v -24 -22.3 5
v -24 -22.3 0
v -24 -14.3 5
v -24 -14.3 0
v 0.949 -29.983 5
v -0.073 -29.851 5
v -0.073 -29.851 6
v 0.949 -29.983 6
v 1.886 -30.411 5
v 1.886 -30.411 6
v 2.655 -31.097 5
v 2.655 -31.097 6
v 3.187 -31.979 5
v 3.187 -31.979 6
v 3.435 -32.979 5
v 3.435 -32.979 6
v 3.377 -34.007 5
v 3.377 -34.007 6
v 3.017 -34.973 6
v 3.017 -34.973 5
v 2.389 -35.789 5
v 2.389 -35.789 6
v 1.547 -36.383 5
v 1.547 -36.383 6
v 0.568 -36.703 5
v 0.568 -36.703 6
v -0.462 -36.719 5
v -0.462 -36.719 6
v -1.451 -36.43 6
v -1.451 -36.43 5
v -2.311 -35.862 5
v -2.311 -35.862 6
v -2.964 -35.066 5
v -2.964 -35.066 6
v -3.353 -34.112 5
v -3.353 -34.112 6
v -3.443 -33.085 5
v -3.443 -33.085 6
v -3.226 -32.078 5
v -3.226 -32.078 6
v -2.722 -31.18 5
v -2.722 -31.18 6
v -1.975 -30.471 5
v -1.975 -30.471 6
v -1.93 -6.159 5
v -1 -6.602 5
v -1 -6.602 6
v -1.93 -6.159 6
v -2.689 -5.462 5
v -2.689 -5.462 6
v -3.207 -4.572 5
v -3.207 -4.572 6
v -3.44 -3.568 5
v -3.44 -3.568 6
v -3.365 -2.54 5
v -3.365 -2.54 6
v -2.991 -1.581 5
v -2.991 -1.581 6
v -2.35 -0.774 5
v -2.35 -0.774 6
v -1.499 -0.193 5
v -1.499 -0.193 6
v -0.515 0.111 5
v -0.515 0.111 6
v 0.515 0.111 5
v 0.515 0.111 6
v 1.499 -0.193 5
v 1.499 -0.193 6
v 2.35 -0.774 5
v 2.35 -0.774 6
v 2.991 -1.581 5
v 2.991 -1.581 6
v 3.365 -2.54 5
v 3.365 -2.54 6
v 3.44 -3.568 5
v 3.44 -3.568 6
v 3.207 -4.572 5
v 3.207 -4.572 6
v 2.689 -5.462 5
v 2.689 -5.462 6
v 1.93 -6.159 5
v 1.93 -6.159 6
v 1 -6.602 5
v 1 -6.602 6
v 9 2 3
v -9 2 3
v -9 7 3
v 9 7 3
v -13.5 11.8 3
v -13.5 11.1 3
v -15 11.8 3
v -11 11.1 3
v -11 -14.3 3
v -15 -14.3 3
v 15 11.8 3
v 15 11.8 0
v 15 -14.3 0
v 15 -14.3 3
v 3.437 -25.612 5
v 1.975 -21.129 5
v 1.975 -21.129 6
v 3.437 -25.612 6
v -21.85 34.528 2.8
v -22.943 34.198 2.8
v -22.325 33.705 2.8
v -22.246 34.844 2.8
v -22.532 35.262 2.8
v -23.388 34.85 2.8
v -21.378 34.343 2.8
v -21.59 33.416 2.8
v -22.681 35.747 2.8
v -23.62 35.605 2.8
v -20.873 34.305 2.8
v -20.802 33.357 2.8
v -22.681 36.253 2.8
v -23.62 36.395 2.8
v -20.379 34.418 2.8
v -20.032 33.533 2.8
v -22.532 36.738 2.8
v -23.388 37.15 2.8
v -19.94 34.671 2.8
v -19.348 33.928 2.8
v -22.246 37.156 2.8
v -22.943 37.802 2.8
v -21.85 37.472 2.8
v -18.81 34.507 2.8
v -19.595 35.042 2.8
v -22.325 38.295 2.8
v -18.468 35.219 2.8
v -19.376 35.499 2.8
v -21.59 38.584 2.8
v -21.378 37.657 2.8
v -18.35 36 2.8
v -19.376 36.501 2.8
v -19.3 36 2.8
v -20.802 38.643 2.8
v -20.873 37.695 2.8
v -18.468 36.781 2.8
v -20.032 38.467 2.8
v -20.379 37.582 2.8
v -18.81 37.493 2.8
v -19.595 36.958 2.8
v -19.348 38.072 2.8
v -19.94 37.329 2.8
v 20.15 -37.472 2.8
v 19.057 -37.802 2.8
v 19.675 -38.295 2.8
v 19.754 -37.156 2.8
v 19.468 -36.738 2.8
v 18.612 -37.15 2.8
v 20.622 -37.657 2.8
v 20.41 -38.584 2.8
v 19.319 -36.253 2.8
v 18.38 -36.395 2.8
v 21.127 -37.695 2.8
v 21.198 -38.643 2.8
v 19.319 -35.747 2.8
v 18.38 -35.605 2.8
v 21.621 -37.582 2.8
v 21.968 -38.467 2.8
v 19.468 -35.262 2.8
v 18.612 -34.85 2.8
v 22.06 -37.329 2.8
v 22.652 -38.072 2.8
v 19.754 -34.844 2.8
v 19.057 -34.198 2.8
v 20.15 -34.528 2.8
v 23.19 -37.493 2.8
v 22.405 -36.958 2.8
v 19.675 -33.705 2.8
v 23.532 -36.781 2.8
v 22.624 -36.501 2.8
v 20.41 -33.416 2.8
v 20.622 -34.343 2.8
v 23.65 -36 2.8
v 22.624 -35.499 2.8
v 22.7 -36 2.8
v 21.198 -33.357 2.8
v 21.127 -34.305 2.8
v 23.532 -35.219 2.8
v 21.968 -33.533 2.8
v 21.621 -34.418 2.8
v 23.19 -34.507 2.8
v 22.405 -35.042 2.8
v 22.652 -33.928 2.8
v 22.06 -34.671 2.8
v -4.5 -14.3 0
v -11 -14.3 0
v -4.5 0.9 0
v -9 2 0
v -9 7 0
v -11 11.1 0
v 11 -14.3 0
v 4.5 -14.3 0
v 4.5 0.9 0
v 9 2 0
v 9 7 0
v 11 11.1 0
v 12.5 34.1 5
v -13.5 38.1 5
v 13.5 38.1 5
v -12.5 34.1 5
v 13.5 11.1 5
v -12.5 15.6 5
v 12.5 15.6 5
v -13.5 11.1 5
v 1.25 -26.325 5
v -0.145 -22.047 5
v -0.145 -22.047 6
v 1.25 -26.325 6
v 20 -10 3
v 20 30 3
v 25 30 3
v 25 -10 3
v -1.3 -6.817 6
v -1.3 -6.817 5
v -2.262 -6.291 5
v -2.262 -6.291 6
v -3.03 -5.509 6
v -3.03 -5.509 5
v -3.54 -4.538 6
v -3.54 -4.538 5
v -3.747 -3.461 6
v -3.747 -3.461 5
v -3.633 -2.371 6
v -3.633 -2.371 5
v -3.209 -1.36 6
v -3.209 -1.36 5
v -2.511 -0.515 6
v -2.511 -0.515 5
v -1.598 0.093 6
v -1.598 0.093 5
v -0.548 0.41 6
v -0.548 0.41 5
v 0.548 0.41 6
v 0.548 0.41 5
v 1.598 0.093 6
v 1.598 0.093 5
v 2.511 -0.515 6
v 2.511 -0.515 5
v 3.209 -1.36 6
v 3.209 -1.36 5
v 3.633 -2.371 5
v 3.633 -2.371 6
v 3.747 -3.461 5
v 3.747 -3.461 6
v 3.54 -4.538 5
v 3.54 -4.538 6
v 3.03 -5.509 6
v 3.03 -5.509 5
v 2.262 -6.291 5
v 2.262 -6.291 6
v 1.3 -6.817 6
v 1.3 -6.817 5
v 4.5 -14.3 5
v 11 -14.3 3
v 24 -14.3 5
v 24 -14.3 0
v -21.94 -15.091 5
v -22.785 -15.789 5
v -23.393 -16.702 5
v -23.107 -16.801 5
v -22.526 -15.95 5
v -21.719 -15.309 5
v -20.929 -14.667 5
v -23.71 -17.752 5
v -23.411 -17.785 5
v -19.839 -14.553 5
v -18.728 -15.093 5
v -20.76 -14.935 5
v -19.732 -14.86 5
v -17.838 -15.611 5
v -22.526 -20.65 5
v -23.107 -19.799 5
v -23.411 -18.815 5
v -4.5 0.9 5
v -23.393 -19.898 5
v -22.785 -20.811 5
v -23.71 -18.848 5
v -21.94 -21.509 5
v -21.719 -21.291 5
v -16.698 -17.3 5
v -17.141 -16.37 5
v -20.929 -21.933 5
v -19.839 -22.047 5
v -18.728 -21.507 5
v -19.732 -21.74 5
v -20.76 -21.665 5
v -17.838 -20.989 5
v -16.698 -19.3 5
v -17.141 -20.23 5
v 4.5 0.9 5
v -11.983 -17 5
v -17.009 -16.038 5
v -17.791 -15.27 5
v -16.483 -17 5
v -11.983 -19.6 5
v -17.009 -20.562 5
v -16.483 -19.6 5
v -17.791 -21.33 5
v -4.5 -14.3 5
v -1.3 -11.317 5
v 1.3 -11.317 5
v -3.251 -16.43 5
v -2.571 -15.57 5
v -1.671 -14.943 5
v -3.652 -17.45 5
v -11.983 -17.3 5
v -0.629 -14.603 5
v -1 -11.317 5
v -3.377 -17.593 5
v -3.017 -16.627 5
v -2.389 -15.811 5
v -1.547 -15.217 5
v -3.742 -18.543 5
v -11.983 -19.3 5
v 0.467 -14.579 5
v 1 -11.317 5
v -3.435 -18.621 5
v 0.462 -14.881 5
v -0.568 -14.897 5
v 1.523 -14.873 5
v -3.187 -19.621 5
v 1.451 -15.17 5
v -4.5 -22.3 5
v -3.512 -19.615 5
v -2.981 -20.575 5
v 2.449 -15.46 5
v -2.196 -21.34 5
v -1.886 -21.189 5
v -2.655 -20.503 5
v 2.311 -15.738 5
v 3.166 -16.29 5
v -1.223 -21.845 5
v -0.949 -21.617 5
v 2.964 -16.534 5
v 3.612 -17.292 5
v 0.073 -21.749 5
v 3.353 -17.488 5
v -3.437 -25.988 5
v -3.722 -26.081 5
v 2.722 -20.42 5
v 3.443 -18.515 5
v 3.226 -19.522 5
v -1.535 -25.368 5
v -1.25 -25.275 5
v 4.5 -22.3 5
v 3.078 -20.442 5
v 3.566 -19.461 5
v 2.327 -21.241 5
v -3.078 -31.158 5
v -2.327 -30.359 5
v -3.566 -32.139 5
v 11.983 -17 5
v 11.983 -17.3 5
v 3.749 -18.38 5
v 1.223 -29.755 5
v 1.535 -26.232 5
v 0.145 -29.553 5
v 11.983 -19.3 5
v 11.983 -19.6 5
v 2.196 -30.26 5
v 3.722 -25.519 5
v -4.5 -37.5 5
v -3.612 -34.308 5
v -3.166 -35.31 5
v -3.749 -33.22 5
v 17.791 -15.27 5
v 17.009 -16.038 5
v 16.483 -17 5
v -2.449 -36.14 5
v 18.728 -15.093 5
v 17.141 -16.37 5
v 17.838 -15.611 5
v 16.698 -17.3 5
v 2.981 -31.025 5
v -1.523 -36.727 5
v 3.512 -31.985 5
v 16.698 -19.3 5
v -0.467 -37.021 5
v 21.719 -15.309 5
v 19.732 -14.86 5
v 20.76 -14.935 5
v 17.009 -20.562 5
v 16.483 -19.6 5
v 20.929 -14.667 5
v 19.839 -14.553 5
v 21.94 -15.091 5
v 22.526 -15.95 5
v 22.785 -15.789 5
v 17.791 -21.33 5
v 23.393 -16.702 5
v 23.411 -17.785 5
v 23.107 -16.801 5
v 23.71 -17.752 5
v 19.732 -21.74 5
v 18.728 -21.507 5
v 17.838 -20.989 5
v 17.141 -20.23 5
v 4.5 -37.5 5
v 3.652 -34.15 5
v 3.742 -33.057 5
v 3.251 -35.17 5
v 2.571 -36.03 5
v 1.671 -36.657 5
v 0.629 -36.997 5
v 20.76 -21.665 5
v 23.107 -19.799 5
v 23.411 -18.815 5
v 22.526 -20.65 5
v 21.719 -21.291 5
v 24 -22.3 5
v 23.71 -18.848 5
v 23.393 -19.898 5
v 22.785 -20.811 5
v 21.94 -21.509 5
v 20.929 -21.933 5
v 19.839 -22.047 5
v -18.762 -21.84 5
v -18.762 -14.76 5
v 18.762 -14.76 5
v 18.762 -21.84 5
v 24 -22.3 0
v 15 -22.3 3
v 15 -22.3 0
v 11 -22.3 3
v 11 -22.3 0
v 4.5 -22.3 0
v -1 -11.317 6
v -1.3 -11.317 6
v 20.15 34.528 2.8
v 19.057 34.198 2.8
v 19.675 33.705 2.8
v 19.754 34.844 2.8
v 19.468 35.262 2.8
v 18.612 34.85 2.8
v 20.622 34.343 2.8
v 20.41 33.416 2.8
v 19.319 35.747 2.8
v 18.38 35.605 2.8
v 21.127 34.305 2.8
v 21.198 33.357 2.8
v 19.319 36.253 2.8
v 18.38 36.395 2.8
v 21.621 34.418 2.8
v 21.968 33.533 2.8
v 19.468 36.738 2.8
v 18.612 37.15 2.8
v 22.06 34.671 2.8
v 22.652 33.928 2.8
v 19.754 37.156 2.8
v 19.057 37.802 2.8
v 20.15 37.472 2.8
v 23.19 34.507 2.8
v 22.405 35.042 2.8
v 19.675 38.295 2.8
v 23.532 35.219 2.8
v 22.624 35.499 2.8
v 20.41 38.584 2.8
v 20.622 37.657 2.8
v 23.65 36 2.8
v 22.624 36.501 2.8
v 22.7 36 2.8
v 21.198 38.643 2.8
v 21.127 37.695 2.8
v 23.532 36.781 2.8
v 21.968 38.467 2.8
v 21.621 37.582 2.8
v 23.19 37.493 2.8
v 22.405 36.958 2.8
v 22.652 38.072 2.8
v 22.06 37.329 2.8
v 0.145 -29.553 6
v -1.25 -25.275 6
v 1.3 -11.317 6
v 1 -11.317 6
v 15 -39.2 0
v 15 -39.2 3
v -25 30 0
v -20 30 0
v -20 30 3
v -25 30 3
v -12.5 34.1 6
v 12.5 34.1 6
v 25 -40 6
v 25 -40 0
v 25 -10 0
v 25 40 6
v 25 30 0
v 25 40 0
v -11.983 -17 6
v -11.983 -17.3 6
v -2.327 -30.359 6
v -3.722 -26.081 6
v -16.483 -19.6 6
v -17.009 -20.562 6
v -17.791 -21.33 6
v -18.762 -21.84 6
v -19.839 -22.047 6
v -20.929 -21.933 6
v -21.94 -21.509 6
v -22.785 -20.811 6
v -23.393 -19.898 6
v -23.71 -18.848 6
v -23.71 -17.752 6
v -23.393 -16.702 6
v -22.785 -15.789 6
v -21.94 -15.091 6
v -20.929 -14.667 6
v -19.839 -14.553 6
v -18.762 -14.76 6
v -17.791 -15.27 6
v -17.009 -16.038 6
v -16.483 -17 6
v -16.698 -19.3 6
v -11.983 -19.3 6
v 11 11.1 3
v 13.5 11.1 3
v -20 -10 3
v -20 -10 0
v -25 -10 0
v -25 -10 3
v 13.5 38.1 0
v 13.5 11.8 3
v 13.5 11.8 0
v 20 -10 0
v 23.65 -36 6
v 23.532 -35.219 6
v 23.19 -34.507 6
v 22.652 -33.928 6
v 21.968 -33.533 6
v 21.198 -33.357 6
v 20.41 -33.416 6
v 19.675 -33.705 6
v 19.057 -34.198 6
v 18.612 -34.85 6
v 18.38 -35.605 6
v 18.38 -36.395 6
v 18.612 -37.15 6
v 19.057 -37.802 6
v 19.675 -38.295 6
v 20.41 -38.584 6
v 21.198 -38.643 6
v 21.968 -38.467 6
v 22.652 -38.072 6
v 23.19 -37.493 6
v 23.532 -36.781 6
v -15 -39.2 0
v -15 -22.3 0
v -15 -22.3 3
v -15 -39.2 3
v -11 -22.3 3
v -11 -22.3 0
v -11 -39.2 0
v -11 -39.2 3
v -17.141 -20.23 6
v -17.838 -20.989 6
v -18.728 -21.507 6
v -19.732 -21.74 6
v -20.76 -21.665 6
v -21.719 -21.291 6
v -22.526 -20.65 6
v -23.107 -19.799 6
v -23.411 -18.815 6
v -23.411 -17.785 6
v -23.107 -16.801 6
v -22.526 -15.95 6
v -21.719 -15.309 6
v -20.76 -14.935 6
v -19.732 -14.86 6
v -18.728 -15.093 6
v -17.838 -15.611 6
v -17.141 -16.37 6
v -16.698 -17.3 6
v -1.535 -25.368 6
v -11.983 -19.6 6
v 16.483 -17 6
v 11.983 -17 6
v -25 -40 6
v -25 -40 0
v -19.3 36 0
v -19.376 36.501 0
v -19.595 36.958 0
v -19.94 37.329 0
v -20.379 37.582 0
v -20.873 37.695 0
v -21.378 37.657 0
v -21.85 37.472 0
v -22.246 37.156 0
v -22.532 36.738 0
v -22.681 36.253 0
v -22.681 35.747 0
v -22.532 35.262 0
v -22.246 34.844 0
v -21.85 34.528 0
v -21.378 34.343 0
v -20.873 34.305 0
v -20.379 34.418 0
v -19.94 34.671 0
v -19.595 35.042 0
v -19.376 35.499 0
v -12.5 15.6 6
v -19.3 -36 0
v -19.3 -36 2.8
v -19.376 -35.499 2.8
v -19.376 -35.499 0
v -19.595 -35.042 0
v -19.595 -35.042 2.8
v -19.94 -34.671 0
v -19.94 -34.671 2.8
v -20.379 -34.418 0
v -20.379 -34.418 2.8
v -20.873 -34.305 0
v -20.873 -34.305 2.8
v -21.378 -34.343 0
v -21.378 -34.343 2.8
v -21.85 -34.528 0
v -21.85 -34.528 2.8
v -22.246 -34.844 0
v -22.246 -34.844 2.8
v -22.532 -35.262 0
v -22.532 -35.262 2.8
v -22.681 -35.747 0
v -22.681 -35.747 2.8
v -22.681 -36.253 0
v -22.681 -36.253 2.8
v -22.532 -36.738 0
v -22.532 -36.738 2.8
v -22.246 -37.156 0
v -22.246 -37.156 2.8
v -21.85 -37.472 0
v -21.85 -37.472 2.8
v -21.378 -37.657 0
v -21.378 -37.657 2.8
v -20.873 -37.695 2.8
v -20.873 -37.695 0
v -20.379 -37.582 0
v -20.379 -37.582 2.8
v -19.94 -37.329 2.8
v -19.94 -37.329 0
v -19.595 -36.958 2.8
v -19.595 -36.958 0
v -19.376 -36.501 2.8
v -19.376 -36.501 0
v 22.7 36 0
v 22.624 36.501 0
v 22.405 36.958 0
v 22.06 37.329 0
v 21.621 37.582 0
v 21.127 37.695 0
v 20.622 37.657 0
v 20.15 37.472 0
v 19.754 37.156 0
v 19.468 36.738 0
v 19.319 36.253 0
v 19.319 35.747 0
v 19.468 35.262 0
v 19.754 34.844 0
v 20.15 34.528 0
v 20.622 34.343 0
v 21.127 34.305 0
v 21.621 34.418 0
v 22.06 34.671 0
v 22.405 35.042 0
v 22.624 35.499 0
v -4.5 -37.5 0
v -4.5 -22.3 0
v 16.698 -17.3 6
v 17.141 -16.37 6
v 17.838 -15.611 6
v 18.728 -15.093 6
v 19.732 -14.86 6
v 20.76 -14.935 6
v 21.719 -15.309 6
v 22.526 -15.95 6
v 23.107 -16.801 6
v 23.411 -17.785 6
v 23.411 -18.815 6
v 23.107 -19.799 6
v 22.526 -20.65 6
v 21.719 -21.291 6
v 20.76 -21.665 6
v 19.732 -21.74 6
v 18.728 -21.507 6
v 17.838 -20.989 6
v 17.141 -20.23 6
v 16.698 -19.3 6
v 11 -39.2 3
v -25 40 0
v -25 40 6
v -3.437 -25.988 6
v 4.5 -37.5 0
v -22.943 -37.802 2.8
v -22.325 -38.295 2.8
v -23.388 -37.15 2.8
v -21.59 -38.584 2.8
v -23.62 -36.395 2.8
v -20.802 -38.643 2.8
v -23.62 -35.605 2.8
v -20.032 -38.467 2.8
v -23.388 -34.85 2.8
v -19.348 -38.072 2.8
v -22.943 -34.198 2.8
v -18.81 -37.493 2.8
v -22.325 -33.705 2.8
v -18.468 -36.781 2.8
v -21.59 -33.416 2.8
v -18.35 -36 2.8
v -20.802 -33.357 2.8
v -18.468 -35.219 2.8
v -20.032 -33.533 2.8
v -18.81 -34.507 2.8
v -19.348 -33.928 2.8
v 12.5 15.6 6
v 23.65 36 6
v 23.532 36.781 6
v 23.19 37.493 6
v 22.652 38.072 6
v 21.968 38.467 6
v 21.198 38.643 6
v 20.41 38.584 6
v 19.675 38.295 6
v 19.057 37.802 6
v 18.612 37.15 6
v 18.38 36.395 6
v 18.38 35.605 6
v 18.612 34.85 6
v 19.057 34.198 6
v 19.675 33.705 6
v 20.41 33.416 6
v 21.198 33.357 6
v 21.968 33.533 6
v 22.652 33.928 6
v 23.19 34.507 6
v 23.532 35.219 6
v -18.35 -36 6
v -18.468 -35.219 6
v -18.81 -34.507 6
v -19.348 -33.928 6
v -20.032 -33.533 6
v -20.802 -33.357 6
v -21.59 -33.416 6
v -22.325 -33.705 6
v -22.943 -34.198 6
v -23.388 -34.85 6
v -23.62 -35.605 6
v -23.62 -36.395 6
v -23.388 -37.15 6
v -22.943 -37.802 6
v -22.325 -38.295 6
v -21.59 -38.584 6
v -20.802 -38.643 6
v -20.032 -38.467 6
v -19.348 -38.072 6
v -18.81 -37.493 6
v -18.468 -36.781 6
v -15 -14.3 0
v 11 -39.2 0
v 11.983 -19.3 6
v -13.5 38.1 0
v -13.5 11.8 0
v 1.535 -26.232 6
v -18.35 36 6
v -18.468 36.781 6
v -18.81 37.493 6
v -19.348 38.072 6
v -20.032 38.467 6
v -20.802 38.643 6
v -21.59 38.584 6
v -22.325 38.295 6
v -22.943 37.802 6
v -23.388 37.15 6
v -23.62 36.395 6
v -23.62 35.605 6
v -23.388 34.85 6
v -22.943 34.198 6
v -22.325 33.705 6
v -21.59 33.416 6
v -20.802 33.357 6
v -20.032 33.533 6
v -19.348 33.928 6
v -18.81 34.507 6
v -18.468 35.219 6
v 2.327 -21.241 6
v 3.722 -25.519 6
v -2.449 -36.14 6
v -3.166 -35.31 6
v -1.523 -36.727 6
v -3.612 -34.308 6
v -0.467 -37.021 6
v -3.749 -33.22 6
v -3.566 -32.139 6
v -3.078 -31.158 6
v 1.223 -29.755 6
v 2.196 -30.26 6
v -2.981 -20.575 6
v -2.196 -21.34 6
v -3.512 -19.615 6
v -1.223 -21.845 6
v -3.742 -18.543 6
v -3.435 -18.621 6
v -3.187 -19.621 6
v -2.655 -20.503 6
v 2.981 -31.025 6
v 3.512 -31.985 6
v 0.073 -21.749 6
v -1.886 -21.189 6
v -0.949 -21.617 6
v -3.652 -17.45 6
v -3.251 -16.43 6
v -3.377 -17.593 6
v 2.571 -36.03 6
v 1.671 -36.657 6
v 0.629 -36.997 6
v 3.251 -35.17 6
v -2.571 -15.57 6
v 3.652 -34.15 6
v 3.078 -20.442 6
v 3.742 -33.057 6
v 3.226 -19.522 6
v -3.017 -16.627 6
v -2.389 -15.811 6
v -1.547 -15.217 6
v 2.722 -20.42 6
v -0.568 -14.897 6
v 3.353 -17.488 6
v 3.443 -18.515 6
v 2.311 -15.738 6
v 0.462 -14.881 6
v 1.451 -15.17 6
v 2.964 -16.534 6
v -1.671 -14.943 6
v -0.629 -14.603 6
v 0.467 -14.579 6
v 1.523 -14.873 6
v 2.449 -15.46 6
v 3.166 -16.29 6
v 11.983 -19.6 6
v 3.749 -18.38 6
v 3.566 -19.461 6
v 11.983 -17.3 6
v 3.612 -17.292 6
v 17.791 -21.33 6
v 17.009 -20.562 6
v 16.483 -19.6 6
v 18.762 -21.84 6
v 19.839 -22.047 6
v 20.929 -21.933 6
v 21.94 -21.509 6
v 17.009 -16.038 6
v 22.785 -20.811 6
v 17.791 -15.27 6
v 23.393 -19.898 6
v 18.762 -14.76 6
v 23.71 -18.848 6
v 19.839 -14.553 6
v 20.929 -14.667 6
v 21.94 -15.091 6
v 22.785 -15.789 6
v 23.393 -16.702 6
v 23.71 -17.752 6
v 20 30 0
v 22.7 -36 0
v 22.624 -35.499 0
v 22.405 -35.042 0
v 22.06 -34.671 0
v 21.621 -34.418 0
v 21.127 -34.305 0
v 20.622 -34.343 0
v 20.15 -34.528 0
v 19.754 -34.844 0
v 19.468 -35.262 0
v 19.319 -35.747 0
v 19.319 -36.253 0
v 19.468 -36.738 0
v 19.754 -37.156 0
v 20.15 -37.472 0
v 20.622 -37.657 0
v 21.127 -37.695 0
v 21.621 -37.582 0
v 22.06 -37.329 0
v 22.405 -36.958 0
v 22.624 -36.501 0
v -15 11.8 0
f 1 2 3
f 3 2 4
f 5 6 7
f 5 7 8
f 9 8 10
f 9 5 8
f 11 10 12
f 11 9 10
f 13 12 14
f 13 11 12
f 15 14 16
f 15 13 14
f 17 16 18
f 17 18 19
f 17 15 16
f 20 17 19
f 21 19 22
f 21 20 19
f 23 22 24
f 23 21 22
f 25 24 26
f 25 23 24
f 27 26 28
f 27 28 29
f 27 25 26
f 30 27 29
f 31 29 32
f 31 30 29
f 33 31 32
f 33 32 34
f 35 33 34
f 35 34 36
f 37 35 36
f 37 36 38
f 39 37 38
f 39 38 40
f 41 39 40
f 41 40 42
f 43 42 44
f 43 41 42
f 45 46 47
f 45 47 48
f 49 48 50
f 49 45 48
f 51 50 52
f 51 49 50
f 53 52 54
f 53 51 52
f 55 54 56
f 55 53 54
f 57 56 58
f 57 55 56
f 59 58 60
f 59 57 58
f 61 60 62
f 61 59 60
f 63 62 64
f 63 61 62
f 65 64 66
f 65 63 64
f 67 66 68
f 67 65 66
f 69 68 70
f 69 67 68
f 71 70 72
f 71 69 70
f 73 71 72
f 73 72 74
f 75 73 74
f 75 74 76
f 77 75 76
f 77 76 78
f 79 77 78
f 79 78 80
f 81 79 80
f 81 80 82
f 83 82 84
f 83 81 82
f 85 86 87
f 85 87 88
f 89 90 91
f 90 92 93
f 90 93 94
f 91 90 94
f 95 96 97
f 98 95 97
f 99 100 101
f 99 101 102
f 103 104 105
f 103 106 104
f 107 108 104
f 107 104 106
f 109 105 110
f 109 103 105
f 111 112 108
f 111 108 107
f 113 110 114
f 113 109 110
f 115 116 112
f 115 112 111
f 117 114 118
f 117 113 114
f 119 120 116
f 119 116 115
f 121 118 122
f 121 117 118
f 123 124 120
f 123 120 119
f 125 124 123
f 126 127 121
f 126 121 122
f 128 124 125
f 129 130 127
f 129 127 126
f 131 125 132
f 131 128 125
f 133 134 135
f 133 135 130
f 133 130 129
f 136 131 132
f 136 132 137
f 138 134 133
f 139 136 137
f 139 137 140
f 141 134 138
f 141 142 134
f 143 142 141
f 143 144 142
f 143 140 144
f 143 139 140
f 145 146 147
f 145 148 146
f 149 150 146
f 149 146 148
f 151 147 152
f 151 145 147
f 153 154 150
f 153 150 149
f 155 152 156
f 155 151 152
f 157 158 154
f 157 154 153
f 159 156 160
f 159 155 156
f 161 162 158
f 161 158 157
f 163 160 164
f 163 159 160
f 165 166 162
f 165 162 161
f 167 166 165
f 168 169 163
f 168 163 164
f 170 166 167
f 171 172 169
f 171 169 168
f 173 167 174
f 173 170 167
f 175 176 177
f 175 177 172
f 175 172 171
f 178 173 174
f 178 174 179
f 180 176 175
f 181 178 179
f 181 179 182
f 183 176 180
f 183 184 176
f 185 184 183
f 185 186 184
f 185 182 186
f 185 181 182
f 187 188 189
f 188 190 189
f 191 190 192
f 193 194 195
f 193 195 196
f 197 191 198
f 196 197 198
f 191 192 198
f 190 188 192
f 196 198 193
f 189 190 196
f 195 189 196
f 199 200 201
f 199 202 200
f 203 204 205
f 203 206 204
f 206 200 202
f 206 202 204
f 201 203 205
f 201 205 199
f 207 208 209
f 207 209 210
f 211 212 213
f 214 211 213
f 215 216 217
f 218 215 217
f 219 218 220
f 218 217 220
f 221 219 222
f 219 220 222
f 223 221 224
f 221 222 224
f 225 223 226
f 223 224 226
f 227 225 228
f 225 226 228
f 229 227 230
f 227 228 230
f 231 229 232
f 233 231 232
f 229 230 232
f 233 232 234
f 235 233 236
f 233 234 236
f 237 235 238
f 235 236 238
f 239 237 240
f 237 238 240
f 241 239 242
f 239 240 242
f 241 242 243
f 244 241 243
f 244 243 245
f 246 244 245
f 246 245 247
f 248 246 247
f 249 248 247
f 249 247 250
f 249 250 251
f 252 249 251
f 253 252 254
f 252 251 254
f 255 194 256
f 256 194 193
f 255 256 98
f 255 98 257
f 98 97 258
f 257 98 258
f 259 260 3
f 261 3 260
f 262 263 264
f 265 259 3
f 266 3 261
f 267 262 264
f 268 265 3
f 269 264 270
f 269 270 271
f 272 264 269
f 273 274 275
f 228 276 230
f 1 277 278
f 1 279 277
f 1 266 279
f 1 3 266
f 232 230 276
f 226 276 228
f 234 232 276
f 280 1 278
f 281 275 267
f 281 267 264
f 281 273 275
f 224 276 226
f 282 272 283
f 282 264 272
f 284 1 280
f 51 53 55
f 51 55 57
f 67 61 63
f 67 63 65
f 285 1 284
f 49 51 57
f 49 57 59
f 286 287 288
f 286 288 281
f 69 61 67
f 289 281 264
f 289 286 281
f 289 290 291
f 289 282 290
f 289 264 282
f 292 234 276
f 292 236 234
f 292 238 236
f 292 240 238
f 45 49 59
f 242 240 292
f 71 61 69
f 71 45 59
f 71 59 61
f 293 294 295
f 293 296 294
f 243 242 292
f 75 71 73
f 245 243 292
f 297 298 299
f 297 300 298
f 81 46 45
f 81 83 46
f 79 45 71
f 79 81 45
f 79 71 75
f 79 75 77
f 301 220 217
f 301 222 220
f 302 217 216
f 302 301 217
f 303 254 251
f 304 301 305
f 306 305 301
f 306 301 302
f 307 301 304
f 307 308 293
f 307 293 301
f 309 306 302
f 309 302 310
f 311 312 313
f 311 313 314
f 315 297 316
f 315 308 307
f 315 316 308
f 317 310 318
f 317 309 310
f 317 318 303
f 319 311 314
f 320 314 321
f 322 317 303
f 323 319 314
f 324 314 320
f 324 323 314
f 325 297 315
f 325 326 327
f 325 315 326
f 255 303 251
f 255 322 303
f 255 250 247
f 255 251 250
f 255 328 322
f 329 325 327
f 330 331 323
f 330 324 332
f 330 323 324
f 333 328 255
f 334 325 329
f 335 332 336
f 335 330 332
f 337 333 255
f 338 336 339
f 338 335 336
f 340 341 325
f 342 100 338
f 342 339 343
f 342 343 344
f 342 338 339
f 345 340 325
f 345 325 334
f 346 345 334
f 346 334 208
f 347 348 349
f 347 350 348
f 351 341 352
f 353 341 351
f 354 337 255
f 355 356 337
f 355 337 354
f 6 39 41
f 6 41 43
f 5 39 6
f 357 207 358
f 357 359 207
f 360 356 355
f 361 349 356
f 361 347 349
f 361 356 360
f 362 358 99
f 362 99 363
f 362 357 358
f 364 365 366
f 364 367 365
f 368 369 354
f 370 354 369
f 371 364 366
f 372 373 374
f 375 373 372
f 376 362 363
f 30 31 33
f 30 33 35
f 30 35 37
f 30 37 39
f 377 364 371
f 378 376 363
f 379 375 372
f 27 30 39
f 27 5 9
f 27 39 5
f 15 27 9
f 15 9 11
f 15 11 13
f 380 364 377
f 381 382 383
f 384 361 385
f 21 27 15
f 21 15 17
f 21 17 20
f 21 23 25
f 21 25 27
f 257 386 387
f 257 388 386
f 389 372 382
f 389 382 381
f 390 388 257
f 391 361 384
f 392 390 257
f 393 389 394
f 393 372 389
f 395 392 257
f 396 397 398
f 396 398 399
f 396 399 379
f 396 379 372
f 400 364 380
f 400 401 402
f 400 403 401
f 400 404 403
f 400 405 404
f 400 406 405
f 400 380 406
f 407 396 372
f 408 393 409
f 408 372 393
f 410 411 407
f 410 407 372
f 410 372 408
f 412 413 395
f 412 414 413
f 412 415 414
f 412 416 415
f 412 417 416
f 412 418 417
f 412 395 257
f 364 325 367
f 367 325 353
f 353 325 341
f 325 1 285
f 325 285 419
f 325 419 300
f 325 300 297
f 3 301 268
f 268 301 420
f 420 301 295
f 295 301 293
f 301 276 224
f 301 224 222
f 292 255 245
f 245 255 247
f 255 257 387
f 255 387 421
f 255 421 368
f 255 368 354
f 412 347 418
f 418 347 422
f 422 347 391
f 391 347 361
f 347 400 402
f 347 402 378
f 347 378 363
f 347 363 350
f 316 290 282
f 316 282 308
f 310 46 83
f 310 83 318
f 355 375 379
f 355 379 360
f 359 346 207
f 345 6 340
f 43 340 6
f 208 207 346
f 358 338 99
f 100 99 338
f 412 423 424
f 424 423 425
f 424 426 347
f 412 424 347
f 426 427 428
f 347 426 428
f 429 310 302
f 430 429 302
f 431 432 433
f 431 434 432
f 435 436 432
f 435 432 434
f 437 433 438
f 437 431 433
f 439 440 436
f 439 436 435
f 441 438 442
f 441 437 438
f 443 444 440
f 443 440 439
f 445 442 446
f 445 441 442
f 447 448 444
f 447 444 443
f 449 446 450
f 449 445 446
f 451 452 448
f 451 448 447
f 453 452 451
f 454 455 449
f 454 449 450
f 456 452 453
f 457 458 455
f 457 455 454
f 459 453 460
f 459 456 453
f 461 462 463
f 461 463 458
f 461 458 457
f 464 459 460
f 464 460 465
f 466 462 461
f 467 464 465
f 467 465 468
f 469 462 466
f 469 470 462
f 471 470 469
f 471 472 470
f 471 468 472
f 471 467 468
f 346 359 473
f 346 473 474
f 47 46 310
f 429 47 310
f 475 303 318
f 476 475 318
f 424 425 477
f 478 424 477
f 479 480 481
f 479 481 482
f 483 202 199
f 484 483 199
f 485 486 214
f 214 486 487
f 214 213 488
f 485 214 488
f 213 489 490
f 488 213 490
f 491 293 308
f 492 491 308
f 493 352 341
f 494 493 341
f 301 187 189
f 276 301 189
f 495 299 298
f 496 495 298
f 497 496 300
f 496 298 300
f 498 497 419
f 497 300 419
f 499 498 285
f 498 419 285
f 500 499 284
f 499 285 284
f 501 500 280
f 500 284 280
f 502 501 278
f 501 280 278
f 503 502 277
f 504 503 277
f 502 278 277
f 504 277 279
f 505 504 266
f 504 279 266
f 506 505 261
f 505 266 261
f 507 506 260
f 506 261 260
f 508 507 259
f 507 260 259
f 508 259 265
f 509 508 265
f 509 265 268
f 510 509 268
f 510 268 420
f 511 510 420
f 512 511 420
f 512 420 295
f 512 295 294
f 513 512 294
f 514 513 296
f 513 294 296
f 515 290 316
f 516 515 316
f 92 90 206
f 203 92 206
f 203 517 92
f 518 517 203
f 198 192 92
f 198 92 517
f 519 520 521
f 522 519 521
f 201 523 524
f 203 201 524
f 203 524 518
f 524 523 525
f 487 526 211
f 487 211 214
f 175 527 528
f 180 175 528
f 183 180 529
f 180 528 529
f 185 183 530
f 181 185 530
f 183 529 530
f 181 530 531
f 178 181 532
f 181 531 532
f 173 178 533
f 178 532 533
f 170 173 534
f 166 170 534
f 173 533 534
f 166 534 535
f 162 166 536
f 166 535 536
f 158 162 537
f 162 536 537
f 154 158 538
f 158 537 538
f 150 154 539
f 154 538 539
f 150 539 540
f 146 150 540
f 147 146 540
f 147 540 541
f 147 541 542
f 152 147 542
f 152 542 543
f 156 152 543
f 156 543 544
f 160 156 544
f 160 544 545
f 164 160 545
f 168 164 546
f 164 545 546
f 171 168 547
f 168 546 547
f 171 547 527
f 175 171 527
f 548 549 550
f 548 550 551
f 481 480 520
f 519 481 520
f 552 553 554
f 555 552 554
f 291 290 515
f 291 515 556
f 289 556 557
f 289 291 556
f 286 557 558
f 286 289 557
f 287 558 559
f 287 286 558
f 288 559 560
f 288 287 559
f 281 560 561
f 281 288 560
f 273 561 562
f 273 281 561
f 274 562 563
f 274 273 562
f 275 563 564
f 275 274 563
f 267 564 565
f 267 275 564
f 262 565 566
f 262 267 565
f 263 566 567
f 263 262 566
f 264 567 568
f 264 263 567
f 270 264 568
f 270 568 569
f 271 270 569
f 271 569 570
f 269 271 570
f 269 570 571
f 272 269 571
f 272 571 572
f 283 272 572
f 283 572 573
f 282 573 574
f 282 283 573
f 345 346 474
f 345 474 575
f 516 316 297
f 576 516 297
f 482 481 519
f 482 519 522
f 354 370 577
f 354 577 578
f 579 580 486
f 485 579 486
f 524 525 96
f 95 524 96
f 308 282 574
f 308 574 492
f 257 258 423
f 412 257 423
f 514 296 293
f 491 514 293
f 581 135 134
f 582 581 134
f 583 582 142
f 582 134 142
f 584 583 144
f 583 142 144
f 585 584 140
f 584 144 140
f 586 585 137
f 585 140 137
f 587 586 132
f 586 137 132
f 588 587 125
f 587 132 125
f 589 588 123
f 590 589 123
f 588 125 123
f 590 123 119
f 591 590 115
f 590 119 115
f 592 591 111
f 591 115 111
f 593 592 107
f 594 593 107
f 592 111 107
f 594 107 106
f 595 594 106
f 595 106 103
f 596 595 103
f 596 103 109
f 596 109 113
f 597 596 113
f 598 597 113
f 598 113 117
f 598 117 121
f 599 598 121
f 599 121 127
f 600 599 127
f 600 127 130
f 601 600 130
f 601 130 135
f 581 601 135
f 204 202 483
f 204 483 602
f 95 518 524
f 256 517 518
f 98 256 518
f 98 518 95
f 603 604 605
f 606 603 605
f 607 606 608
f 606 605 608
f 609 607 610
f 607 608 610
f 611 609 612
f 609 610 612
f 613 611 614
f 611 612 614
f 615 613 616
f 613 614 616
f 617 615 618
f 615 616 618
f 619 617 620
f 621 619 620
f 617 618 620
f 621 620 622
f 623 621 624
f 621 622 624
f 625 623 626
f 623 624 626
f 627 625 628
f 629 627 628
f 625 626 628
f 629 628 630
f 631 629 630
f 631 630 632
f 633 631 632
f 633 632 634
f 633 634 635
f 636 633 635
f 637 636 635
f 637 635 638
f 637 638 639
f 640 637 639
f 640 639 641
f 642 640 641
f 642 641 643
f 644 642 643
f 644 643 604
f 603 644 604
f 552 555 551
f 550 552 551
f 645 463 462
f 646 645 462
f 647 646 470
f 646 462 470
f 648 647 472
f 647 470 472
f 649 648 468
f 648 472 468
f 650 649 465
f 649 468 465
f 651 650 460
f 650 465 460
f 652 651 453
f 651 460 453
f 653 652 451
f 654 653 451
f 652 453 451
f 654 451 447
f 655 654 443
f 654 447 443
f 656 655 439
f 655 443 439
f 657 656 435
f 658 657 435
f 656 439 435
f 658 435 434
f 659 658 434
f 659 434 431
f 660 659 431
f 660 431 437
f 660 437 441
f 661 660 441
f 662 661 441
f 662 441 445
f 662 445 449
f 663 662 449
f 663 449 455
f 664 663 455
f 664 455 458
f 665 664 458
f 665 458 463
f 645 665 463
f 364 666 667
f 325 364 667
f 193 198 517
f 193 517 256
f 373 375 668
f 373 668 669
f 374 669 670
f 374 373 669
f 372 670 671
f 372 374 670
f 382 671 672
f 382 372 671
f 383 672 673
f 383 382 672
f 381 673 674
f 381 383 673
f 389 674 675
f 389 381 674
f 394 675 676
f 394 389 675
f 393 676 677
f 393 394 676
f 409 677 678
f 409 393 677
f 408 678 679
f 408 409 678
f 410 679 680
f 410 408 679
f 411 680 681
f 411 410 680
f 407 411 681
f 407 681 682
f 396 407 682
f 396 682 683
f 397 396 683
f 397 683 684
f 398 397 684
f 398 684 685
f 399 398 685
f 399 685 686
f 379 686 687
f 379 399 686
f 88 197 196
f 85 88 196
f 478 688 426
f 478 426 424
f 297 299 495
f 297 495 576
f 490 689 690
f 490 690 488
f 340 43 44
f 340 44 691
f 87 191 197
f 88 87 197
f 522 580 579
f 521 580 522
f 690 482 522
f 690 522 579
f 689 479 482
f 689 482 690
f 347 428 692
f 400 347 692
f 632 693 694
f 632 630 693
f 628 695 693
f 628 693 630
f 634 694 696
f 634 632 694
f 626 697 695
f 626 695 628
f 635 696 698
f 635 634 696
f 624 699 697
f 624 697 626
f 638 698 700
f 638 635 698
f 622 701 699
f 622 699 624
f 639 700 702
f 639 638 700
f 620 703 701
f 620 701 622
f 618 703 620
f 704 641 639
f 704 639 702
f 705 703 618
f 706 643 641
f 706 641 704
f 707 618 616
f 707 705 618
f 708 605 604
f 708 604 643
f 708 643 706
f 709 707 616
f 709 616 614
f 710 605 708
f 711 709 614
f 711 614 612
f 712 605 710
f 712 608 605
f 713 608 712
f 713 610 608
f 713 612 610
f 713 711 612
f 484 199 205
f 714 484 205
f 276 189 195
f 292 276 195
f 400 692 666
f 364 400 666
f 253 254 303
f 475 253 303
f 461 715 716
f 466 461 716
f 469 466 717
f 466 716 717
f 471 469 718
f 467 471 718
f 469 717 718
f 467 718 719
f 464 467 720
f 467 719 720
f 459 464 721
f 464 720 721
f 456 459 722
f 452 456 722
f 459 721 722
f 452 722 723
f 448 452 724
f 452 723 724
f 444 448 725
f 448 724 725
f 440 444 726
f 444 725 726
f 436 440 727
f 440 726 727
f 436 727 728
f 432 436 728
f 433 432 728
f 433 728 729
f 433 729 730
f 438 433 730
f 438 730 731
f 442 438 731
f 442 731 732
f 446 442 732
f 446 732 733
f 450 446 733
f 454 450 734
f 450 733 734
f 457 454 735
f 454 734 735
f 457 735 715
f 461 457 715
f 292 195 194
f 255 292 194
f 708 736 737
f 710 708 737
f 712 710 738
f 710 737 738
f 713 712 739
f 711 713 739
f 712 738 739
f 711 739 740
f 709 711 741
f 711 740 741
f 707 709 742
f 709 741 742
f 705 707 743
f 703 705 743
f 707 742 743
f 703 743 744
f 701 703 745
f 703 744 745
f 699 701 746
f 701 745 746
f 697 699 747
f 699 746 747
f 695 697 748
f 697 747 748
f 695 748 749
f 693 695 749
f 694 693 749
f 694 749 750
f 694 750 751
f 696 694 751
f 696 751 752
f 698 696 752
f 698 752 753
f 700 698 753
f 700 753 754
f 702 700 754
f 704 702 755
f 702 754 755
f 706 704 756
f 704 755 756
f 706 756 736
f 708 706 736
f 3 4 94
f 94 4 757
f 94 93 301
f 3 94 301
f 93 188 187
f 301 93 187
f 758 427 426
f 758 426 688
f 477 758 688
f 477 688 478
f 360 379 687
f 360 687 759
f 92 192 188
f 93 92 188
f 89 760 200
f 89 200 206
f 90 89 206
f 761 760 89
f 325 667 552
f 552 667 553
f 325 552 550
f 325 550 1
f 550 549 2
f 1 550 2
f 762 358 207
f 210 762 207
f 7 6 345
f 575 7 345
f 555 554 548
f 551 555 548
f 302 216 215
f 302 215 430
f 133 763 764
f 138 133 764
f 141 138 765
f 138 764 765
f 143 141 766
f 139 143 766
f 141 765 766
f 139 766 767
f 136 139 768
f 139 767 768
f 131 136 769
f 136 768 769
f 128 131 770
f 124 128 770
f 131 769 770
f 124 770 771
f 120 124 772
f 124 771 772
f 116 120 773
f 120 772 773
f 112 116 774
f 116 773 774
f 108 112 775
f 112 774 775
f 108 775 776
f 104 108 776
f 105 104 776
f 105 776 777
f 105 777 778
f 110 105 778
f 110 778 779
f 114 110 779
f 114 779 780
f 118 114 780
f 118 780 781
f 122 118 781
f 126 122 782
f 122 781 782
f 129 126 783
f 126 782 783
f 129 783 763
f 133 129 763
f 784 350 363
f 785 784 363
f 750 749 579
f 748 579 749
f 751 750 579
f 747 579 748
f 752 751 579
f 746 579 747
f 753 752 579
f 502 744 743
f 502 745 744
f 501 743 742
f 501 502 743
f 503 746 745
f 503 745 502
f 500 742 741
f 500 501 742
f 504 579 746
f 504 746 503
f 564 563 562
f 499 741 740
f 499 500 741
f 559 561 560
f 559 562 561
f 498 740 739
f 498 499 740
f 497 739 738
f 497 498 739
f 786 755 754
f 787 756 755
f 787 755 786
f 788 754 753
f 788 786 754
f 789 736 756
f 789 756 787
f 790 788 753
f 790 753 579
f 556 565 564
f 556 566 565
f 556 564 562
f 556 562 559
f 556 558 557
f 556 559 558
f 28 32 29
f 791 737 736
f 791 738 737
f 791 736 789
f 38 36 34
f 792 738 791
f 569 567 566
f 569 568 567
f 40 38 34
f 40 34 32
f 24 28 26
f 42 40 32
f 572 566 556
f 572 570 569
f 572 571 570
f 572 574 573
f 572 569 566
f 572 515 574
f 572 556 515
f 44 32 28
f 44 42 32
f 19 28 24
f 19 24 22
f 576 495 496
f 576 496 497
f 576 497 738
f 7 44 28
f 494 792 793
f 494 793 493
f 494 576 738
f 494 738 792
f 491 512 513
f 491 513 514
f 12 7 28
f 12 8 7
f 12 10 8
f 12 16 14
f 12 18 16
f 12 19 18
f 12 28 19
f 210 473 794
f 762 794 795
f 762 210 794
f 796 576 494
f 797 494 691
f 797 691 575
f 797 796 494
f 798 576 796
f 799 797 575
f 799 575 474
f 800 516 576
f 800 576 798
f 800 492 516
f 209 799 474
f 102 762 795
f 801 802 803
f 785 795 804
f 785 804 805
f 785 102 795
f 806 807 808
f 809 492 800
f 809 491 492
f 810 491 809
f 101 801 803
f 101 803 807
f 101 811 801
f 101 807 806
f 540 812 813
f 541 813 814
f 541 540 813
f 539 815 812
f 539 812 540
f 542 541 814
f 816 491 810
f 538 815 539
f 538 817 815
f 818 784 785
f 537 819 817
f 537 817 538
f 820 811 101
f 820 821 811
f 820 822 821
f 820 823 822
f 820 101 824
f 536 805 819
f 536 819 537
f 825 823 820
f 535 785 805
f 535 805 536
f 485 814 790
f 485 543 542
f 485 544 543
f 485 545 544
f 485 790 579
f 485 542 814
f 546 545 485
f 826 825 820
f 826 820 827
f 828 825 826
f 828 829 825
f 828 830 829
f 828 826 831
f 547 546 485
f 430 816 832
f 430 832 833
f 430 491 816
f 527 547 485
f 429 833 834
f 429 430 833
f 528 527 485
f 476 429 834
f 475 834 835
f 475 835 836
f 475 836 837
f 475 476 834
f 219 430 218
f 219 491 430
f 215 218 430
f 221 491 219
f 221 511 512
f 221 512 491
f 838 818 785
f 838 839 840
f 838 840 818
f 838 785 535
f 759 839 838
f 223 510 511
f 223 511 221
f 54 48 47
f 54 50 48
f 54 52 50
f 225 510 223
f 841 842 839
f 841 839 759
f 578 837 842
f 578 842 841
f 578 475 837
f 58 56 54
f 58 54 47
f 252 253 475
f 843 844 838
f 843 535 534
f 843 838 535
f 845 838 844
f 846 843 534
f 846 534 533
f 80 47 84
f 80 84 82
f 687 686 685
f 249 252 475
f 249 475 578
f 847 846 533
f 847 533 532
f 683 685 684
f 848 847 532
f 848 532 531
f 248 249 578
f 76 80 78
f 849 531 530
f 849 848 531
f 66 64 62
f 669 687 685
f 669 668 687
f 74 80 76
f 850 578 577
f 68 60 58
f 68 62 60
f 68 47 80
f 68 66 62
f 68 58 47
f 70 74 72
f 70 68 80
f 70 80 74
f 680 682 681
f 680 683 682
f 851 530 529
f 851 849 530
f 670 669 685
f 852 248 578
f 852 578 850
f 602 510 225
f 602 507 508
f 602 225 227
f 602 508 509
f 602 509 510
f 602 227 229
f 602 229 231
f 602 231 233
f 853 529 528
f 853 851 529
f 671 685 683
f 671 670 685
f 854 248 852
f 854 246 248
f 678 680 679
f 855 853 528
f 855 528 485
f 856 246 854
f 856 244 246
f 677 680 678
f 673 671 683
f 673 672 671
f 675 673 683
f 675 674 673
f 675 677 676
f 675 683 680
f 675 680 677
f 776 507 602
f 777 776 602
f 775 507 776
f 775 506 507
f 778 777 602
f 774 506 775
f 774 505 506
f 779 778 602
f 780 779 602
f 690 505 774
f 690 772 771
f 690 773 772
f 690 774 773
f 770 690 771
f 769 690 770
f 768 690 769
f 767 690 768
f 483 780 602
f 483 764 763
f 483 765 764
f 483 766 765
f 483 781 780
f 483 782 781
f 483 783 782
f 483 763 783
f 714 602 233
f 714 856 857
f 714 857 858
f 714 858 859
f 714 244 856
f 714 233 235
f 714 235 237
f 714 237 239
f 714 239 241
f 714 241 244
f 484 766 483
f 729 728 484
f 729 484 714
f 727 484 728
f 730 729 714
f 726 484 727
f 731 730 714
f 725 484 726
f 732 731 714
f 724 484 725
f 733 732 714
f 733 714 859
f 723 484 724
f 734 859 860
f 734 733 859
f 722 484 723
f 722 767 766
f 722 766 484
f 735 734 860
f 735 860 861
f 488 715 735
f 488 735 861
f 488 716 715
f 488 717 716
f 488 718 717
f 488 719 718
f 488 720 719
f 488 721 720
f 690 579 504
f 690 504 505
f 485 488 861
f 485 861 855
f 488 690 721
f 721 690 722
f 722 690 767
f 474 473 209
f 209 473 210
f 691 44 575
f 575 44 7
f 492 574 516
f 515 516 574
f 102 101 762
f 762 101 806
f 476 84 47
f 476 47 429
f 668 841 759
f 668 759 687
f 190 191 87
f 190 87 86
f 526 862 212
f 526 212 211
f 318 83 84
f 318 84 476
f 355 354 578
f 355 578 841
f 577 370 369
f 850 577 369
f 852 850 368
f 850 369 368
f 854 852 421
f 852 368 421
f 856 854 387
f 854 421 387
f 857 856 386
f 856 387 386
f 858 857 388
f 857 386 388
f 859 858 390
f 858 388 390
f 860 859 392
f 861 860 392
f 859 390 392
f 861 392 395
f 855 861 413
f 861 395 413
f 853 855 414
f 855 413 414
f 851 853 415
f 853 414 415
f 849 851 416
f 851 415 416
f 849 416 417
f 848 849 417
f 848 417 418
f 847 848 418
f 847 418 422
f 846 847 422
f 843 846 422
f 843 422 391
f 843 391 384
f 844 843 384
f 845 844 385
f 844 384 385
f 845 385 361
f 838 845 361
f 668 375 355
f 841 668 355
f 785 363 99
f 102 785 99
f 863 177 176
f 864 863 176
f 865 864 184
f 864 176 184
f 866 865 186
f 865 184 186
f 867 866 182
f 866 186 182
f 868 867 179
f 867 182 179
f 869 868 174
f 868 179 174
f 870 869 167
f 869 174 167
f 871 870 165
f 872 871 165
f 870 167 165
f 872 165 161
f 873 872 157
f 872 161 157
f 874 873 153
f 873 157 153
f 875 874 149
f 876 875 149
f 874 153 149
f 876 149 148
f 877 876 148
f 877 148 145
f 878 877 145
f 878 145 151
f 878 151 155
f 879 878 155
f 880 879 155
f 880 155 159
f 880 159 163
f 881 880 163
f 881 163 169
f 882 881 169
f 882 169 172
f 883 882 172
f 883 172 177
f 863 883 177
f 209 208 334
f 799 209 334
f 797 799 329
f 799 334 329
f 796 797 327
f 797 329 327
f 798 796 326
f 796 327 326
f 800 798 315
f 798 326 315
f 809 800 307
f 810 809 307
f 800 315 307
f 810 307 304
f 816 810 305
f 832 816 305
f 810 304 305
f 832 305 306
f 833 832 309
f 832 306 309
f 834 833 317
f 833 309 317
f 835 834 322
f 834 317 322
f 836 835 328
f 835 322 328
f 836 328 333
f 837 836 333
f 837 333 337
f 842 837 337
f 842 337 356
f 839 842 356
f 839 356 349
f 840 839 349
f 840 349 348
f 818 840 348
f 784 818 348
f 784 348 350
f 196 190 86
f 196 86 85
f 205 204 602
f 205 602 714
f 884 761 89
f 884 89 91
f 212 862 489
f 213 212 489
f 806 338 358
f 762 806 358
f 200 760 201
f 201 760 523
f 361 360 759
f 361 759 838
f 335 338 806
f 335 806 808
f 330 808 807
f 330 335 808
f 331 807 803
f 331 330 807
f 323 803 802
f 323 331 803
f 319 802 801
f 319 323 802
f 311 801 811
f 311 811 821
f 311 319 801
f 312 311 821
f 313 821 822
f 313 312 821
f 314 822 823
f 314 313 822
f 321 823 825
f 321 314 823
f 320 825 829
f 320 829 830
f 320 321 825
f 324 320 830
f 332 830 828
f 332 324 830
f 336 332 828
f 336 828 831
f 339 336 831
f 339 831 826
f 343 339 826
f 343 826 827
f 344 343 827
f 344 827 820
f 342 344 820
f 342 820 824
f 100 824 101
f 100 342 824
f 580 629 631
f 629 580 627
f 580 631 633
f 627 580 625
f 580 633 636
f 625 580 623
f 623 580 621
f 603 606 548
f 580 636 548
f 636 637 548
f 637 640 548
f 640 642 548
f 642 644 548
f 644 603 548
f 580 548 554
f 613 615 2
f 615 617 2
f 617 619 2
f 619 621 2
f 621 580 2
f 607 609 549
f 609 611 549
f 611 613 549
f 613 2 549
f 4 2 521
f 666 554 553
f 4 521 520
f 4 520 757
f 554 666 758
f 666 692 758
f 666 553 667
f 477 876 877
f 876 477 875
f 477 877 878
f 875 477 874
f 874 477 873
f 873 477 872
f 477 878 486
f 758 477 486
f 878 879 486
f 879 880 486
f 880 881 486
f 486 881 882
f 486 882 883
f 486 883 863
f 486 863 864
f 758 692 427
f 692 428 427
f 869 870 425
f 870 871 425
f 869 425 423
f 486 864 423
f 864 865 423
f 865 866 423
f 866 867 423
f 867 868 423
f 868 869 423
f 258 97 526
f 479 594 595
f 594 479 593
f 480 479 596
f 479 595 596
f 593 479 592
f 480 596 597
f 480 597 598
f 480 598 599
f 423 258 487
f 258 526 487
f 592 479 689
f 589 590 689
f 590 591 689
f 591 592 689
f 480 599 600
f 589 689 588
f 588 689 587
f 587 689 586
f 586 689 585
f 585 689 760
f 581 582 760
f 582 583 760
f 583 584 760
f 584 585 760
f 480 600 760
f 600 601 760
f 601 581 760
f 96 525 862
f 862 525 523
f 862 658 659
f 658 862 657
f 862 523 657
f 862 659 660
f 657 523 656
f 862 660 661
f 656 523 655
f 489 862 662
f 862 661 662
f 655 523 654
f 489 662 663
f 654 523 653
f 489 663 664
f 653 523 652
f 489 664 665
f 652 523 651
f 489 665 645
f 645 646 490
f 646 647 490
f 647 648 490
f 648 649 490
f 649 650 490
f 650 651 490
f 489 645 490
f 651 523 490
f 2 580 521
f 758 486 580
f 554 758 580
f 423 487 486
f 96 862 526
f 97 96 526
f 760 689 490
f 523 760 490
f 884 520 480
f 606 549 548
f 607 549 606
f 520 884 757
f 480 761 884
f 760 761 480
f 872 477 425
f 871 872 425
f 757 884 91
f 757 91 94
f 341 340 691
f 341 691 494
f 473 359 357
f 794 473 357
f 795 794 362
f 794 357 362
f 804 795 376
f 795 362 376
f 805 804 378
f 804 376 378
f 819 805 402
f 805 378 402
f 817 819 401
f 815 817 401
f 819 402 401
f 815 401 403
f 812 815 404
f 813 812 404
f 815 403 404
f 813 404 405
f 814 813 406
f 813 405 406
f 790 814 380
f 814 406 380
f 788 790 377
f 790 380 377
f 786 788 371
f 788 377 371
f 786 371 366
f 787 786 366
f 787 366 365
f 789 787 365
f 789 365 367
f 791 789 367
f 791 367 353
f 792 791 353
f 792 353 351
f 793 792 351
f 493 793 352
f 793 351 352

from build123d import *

# Parameters (mm, degrees)
SKETCH011_W     = 50
SKETCH011_H     = 80
PAD005_DEPTH    = 6
SKETCH012_R     = 1.7
POCKET005_DEPTH = 6
SKETCH013_W     = 7
SKETCH013_H     = 6
POCKET006_DEPTH = 5
SKETCH014_W     = 27
SKETCH014_H     = 27
POCKET007_DEPTH = 5
SKETCH015_W     = 25
SKETCH015_H     = 18.5
POCKET008_DEPTH = 1
POCKET009_DEPTH = 5
POCKET010_DEPTH = 1
SKETCH019_W     = 18
SKETCH019_H     = 5
POCKET011_DEPTH = 3
SKETCH020_W     = 4
SKETCH020_H     = 51
POCKET012_DEPTH = 3
SKETCH021_W     = 5
SKETCH021_H     = 40
POCKET013_DEPTH = 3
SKETCH023_R     = 2.65
POCKET014_DEPTH = 3.2


with BuildPart() as part:
    # Sketch011 → Pad005 (new body)
    with BuildSketch(Plane.XY):
        Rectangle(SKETCH011_W, SKETCH011_H)
    extrude(amount=PAD005_DEPTH)

    # Sketch012 (on Face6 of Pad005) → Pocket005 (cut)
    with BuildSketch(Plane.XY.offset(6)):
        with Locations((-21, 36)):
            Circle(SKETCH012_R)
        with Locations((21, 36)):
            Circle(SKETCH012_R)
        with Locations((-21, -36)):
            Circle(SKETCH012_R)
        with Locations((21, -36)):
            Circle(SKETCH012_R)
    extrude(amount=-POCKET005_DEPTH, mode=Mode.SUBTRACT)

    # Sketch013 (on Face4 of Pocket005) → Pocket006 (cut)
    with BuildSketch(Plane(origin=(0, 0, 0), x_dir=(1, 0, 0), z_dir=(0, 0, -1))):
        with Locations((0, 33.3)):
            Rectangle(SKETCH013_W, SKETCH013_H)
        with Locations((0, 3.3)):
            Rectangle(SKETCH013_W, SKETCH013_H)
        with Locations((0, 18.3)):
            Rectangle(SKETCH013_W, SKETCH013_H)
        with Locations((20, 18.3)):
            Rectangle(SKETCH013_W, SKETCH013_H)
        with Locations((-20, 18.3)):
            Rectangle(SKETCH013_W, SKETCH013_H)
    extrude(amount=-POCKET006_DEPTH, mode=Mode.SUBTRACT)

    # Sketch014 (on Face4 of Pocket006) → Pocket007 (cut)
    with BuildSketch(Plane(origin=(0, 0, 0), x_dir=(1, 0, 0), z_dir=(0, 0, -1))):
        with Locations((0, -24.6)):
            Rectangle(SKETCH014_W, SKETCH014_H)
    extrude(amount=-POCKET007_DEPTH, mode=Mode.SUBTRACT)

    # Sketch015 (on Face40 of Pocket007) → Pocket008 (cut)
    with BuildSketch(Plane(origin=(0, 0, 5), x_dir=(1, 0, 0), z_dir=(0, 0, -1))):
        with Locations((0, -24.85)):
            Rectangle(SKETCH015_W, SKETCH015_H)
    extrude(amount=-POCKET008_DEPTH, mode=Mode.SUBTRACT)

    # Sketch017 (on Face4 of Pocket008) → Pocket009 (cut)
    with BuildSketch(Plane(origin=(0, 0, 0), x_dir=(1, 0, 0), z_dir=(0, 0, -1))):
        Polygon((4.5, 37.5), (-4.5, 37.5), (-4.5, 22.3), (-24, 22.3), (-24, 14.3), (-4.5, 14.3), (-4.5, -0.9), (4.5, -0.9), (4.5, 14.3), (24, 14.3), (24, 22.3), (4.5, 22.3), align=None)
    extrude(amount=-POCKET009_DEPTH, mode=Mode.SUBTRACT)

    # Sketch018 (on Face32 of Pocket009) → Pocket010 (cut)
    with BuildSketch(Plane(origin=(0, 0, 5), x_dir=(1, 0, 0), z_dir=(0, 0, -1))):
        with BuildLine():
            ThreePointArc((0.145291, 29.552816), (1.162743, 36.865183), (-2.326569, 30.358984))
            Line((-2.326569, 30.358984), (-3.72186, 26.080764))
            Line((-3.436646, 25.987745), (-3.72186, 26.080764))
            Line((-1.974516, 30.470904), (-3.436646, 25.987745))
            ThreePointArc((-0.073085, 29.850774), (1.069723, 36.579968), (-1.974516, 30.470904))
            Line((-0.073085, 29.850774), (-1.535215, 25.367615))
            Line((-1.25, 25.274596), (-1.535215, 25.367615))
            Line((0.145291, 29.552816), (-1.25, 25.274596))
        make_face()
        with BuildLine():
            ThreePointArc((-16.482544, 19.6), (-23.75, 18.3), (-16.482544, 17))
            Line((-16.482544, 17), (-11.982544, 17))
            Line((-11.982544, 17), (-11.982544, 17.3))
            Line((-16.698107, 17.3), (-11.982544, 17.3))
            ThreePointArc((-16.698107, 19.3), (-23.45, 18.3), (-16.698107, 17.3))
            Line((-16.698107, 19.3), (-11.982544, 19.3))
            Line((-11.982544, 19.3), (-11.982544, 19.6))
            Line((-16.482544, 19.6), (-11.982544, 19.6))
        make_face()
        with BuildLine():
            ThreePointArc((16.482544, 17), (23.75, 18.3), (16.482544, 19.6))
            Line((16.482544, 19.6), (11.982544, 19.6))
            Line((11.982544, 19.3), (11.982544, 19.6))
            Line((16.698107, 19.3), (11.982544, 19.3))
            ThreePointArc((16.698107, 17.3), (23.45, 18.3), (16.698107, 19.3))
            Line((16.698107, 17.3), (11.982544, 17.3))
            Line((11.982544, 17), (11.982544, 17.3))
            Line((16.482544, 17), (11.982544, 17))
        make_face()
        with BuildLine():
            ThreePointArc((-1.3, 6.817456), (0, -0.45), (1.3, 6.817456))
            Line((1.3, 6.817456), (1.3, 11.317456))
            Line((1.3, 11.317456), (1, 11.317456))
            Line((1, 6.601893), (1, 11.317456))
            ThreePointArc((-1, 6.601893), (0, -0.15), (1, 6.601893))
            Line((-1, 6.601893), (-1, 11.317456))
            Line((-1, 11.317456), (-1.3, 11.317456))
            Line((-1.3, 6.817456), (-1.3, 11.317456))
        make_face()
        with BuildLine():
            ThreePointArc((-0.145291, 22.047184), (-1.162743, 14.734817), (2.326569, 21.241016))
            Line((2.326569, 21.241016), (3.72186, 25.519236))
            Line((3.72186, 25.519236), (3.436646, 25.612255))
            Line((1.974516, 21.129096), (3.436646, 25.612255))
            ThreePointArc((0.073085, 21.749226), (-1.069723, 15.020032), (1.974516, 21.129096))
            Line((0.073085, 21.749226), (1.535215, 26.232385))
            Line((1.535215, 26.232385), (1.25, 26.325404))
            Line((-0.145291, 22.047184), (1.25, 26.325404))
        make_face()
    extrude(amount=-POCKET010_DEPTH, mode=Mode.SUBTRACT)

    # Sketch019 (on Face4 of Pocket010) → Pocket011 (cut)
    with BuildSketch(Plane(origin=(0, 0, 0), x_dir=(1, 0, 0), z_dir=(0, 0, -1))):
        with Locations((0, -4.5)):
            Rectangle(SKETCH019_W, SKETCH019_H)
    extrude(amount=-POCKET011_DEPTH, mode=Mode.SUBTRACT)

    # Sketch020 (on Face4 of Pocket011) → Pocket012 (cut)
    with BuildSketch(Plane(origin=(0, 0, 0), x_dir=(1, 0, 0), z_dir=(0, 0, -1))):
        with Locations((13, 13.7)):
            Rectangle(SKETCH020_W, SKETCH020_H)
    pocket012 = extrude(amount=-POCKET012_DEPTH, mode=Mode.SUBTRACT)

    # Mirrored003: Pocket012 across Sketch020 V_Axis
    add(pocket012.mirror(Plane(origin=(0, 0, 0), x_dir=(0, 0, -1), z_dir=(1, 0, 0))), mode=Mode.SUBTRACT)

    # Sketch021 (on Face4 of Mirrored003) → Pocket013 (cut)
    with BuildSketch(Plane(origin=(0, 0, 0), x_dir=(1, 0, 0), z_dir=(0, 0, -1))):
        with Locations((22.5, -10)):
            Rectangle(SKETCH021_W, SKETCH021_H)
    pocket013 = extrude(amount=-POCKET013_DEPTH, mode=Mode.SUBTRACT)

    # Mirrored004: Pocket013 across Sketch021 V_Axis
    add(pocket013.mirror(Plane(origin=(0, 0, 0), x_dir=(0, 0, -1), z_dir=(1, 0, 0))), mode=Mode.SUBTRACT)

    # Sketch023 (on Face7 of Mirrored004) → Pocket014 (cut)
    with BuildSketch(Plane.XY.offset(6)):
        with Locations((21, 36)):
            Circle(SKETCH023_R)
        with Locations((-21, 36)):
            Circle(SKETCH023_R)
        with Locations((-21, -36)):
            Circle(SKETCH023_R)
        with Locations((21, -36)):
            Circle(SKETCH023_R)
    extrude(amount=-POCKET014_DEPTH, mode=Mode.SUBTRACT)


solid = part.part
